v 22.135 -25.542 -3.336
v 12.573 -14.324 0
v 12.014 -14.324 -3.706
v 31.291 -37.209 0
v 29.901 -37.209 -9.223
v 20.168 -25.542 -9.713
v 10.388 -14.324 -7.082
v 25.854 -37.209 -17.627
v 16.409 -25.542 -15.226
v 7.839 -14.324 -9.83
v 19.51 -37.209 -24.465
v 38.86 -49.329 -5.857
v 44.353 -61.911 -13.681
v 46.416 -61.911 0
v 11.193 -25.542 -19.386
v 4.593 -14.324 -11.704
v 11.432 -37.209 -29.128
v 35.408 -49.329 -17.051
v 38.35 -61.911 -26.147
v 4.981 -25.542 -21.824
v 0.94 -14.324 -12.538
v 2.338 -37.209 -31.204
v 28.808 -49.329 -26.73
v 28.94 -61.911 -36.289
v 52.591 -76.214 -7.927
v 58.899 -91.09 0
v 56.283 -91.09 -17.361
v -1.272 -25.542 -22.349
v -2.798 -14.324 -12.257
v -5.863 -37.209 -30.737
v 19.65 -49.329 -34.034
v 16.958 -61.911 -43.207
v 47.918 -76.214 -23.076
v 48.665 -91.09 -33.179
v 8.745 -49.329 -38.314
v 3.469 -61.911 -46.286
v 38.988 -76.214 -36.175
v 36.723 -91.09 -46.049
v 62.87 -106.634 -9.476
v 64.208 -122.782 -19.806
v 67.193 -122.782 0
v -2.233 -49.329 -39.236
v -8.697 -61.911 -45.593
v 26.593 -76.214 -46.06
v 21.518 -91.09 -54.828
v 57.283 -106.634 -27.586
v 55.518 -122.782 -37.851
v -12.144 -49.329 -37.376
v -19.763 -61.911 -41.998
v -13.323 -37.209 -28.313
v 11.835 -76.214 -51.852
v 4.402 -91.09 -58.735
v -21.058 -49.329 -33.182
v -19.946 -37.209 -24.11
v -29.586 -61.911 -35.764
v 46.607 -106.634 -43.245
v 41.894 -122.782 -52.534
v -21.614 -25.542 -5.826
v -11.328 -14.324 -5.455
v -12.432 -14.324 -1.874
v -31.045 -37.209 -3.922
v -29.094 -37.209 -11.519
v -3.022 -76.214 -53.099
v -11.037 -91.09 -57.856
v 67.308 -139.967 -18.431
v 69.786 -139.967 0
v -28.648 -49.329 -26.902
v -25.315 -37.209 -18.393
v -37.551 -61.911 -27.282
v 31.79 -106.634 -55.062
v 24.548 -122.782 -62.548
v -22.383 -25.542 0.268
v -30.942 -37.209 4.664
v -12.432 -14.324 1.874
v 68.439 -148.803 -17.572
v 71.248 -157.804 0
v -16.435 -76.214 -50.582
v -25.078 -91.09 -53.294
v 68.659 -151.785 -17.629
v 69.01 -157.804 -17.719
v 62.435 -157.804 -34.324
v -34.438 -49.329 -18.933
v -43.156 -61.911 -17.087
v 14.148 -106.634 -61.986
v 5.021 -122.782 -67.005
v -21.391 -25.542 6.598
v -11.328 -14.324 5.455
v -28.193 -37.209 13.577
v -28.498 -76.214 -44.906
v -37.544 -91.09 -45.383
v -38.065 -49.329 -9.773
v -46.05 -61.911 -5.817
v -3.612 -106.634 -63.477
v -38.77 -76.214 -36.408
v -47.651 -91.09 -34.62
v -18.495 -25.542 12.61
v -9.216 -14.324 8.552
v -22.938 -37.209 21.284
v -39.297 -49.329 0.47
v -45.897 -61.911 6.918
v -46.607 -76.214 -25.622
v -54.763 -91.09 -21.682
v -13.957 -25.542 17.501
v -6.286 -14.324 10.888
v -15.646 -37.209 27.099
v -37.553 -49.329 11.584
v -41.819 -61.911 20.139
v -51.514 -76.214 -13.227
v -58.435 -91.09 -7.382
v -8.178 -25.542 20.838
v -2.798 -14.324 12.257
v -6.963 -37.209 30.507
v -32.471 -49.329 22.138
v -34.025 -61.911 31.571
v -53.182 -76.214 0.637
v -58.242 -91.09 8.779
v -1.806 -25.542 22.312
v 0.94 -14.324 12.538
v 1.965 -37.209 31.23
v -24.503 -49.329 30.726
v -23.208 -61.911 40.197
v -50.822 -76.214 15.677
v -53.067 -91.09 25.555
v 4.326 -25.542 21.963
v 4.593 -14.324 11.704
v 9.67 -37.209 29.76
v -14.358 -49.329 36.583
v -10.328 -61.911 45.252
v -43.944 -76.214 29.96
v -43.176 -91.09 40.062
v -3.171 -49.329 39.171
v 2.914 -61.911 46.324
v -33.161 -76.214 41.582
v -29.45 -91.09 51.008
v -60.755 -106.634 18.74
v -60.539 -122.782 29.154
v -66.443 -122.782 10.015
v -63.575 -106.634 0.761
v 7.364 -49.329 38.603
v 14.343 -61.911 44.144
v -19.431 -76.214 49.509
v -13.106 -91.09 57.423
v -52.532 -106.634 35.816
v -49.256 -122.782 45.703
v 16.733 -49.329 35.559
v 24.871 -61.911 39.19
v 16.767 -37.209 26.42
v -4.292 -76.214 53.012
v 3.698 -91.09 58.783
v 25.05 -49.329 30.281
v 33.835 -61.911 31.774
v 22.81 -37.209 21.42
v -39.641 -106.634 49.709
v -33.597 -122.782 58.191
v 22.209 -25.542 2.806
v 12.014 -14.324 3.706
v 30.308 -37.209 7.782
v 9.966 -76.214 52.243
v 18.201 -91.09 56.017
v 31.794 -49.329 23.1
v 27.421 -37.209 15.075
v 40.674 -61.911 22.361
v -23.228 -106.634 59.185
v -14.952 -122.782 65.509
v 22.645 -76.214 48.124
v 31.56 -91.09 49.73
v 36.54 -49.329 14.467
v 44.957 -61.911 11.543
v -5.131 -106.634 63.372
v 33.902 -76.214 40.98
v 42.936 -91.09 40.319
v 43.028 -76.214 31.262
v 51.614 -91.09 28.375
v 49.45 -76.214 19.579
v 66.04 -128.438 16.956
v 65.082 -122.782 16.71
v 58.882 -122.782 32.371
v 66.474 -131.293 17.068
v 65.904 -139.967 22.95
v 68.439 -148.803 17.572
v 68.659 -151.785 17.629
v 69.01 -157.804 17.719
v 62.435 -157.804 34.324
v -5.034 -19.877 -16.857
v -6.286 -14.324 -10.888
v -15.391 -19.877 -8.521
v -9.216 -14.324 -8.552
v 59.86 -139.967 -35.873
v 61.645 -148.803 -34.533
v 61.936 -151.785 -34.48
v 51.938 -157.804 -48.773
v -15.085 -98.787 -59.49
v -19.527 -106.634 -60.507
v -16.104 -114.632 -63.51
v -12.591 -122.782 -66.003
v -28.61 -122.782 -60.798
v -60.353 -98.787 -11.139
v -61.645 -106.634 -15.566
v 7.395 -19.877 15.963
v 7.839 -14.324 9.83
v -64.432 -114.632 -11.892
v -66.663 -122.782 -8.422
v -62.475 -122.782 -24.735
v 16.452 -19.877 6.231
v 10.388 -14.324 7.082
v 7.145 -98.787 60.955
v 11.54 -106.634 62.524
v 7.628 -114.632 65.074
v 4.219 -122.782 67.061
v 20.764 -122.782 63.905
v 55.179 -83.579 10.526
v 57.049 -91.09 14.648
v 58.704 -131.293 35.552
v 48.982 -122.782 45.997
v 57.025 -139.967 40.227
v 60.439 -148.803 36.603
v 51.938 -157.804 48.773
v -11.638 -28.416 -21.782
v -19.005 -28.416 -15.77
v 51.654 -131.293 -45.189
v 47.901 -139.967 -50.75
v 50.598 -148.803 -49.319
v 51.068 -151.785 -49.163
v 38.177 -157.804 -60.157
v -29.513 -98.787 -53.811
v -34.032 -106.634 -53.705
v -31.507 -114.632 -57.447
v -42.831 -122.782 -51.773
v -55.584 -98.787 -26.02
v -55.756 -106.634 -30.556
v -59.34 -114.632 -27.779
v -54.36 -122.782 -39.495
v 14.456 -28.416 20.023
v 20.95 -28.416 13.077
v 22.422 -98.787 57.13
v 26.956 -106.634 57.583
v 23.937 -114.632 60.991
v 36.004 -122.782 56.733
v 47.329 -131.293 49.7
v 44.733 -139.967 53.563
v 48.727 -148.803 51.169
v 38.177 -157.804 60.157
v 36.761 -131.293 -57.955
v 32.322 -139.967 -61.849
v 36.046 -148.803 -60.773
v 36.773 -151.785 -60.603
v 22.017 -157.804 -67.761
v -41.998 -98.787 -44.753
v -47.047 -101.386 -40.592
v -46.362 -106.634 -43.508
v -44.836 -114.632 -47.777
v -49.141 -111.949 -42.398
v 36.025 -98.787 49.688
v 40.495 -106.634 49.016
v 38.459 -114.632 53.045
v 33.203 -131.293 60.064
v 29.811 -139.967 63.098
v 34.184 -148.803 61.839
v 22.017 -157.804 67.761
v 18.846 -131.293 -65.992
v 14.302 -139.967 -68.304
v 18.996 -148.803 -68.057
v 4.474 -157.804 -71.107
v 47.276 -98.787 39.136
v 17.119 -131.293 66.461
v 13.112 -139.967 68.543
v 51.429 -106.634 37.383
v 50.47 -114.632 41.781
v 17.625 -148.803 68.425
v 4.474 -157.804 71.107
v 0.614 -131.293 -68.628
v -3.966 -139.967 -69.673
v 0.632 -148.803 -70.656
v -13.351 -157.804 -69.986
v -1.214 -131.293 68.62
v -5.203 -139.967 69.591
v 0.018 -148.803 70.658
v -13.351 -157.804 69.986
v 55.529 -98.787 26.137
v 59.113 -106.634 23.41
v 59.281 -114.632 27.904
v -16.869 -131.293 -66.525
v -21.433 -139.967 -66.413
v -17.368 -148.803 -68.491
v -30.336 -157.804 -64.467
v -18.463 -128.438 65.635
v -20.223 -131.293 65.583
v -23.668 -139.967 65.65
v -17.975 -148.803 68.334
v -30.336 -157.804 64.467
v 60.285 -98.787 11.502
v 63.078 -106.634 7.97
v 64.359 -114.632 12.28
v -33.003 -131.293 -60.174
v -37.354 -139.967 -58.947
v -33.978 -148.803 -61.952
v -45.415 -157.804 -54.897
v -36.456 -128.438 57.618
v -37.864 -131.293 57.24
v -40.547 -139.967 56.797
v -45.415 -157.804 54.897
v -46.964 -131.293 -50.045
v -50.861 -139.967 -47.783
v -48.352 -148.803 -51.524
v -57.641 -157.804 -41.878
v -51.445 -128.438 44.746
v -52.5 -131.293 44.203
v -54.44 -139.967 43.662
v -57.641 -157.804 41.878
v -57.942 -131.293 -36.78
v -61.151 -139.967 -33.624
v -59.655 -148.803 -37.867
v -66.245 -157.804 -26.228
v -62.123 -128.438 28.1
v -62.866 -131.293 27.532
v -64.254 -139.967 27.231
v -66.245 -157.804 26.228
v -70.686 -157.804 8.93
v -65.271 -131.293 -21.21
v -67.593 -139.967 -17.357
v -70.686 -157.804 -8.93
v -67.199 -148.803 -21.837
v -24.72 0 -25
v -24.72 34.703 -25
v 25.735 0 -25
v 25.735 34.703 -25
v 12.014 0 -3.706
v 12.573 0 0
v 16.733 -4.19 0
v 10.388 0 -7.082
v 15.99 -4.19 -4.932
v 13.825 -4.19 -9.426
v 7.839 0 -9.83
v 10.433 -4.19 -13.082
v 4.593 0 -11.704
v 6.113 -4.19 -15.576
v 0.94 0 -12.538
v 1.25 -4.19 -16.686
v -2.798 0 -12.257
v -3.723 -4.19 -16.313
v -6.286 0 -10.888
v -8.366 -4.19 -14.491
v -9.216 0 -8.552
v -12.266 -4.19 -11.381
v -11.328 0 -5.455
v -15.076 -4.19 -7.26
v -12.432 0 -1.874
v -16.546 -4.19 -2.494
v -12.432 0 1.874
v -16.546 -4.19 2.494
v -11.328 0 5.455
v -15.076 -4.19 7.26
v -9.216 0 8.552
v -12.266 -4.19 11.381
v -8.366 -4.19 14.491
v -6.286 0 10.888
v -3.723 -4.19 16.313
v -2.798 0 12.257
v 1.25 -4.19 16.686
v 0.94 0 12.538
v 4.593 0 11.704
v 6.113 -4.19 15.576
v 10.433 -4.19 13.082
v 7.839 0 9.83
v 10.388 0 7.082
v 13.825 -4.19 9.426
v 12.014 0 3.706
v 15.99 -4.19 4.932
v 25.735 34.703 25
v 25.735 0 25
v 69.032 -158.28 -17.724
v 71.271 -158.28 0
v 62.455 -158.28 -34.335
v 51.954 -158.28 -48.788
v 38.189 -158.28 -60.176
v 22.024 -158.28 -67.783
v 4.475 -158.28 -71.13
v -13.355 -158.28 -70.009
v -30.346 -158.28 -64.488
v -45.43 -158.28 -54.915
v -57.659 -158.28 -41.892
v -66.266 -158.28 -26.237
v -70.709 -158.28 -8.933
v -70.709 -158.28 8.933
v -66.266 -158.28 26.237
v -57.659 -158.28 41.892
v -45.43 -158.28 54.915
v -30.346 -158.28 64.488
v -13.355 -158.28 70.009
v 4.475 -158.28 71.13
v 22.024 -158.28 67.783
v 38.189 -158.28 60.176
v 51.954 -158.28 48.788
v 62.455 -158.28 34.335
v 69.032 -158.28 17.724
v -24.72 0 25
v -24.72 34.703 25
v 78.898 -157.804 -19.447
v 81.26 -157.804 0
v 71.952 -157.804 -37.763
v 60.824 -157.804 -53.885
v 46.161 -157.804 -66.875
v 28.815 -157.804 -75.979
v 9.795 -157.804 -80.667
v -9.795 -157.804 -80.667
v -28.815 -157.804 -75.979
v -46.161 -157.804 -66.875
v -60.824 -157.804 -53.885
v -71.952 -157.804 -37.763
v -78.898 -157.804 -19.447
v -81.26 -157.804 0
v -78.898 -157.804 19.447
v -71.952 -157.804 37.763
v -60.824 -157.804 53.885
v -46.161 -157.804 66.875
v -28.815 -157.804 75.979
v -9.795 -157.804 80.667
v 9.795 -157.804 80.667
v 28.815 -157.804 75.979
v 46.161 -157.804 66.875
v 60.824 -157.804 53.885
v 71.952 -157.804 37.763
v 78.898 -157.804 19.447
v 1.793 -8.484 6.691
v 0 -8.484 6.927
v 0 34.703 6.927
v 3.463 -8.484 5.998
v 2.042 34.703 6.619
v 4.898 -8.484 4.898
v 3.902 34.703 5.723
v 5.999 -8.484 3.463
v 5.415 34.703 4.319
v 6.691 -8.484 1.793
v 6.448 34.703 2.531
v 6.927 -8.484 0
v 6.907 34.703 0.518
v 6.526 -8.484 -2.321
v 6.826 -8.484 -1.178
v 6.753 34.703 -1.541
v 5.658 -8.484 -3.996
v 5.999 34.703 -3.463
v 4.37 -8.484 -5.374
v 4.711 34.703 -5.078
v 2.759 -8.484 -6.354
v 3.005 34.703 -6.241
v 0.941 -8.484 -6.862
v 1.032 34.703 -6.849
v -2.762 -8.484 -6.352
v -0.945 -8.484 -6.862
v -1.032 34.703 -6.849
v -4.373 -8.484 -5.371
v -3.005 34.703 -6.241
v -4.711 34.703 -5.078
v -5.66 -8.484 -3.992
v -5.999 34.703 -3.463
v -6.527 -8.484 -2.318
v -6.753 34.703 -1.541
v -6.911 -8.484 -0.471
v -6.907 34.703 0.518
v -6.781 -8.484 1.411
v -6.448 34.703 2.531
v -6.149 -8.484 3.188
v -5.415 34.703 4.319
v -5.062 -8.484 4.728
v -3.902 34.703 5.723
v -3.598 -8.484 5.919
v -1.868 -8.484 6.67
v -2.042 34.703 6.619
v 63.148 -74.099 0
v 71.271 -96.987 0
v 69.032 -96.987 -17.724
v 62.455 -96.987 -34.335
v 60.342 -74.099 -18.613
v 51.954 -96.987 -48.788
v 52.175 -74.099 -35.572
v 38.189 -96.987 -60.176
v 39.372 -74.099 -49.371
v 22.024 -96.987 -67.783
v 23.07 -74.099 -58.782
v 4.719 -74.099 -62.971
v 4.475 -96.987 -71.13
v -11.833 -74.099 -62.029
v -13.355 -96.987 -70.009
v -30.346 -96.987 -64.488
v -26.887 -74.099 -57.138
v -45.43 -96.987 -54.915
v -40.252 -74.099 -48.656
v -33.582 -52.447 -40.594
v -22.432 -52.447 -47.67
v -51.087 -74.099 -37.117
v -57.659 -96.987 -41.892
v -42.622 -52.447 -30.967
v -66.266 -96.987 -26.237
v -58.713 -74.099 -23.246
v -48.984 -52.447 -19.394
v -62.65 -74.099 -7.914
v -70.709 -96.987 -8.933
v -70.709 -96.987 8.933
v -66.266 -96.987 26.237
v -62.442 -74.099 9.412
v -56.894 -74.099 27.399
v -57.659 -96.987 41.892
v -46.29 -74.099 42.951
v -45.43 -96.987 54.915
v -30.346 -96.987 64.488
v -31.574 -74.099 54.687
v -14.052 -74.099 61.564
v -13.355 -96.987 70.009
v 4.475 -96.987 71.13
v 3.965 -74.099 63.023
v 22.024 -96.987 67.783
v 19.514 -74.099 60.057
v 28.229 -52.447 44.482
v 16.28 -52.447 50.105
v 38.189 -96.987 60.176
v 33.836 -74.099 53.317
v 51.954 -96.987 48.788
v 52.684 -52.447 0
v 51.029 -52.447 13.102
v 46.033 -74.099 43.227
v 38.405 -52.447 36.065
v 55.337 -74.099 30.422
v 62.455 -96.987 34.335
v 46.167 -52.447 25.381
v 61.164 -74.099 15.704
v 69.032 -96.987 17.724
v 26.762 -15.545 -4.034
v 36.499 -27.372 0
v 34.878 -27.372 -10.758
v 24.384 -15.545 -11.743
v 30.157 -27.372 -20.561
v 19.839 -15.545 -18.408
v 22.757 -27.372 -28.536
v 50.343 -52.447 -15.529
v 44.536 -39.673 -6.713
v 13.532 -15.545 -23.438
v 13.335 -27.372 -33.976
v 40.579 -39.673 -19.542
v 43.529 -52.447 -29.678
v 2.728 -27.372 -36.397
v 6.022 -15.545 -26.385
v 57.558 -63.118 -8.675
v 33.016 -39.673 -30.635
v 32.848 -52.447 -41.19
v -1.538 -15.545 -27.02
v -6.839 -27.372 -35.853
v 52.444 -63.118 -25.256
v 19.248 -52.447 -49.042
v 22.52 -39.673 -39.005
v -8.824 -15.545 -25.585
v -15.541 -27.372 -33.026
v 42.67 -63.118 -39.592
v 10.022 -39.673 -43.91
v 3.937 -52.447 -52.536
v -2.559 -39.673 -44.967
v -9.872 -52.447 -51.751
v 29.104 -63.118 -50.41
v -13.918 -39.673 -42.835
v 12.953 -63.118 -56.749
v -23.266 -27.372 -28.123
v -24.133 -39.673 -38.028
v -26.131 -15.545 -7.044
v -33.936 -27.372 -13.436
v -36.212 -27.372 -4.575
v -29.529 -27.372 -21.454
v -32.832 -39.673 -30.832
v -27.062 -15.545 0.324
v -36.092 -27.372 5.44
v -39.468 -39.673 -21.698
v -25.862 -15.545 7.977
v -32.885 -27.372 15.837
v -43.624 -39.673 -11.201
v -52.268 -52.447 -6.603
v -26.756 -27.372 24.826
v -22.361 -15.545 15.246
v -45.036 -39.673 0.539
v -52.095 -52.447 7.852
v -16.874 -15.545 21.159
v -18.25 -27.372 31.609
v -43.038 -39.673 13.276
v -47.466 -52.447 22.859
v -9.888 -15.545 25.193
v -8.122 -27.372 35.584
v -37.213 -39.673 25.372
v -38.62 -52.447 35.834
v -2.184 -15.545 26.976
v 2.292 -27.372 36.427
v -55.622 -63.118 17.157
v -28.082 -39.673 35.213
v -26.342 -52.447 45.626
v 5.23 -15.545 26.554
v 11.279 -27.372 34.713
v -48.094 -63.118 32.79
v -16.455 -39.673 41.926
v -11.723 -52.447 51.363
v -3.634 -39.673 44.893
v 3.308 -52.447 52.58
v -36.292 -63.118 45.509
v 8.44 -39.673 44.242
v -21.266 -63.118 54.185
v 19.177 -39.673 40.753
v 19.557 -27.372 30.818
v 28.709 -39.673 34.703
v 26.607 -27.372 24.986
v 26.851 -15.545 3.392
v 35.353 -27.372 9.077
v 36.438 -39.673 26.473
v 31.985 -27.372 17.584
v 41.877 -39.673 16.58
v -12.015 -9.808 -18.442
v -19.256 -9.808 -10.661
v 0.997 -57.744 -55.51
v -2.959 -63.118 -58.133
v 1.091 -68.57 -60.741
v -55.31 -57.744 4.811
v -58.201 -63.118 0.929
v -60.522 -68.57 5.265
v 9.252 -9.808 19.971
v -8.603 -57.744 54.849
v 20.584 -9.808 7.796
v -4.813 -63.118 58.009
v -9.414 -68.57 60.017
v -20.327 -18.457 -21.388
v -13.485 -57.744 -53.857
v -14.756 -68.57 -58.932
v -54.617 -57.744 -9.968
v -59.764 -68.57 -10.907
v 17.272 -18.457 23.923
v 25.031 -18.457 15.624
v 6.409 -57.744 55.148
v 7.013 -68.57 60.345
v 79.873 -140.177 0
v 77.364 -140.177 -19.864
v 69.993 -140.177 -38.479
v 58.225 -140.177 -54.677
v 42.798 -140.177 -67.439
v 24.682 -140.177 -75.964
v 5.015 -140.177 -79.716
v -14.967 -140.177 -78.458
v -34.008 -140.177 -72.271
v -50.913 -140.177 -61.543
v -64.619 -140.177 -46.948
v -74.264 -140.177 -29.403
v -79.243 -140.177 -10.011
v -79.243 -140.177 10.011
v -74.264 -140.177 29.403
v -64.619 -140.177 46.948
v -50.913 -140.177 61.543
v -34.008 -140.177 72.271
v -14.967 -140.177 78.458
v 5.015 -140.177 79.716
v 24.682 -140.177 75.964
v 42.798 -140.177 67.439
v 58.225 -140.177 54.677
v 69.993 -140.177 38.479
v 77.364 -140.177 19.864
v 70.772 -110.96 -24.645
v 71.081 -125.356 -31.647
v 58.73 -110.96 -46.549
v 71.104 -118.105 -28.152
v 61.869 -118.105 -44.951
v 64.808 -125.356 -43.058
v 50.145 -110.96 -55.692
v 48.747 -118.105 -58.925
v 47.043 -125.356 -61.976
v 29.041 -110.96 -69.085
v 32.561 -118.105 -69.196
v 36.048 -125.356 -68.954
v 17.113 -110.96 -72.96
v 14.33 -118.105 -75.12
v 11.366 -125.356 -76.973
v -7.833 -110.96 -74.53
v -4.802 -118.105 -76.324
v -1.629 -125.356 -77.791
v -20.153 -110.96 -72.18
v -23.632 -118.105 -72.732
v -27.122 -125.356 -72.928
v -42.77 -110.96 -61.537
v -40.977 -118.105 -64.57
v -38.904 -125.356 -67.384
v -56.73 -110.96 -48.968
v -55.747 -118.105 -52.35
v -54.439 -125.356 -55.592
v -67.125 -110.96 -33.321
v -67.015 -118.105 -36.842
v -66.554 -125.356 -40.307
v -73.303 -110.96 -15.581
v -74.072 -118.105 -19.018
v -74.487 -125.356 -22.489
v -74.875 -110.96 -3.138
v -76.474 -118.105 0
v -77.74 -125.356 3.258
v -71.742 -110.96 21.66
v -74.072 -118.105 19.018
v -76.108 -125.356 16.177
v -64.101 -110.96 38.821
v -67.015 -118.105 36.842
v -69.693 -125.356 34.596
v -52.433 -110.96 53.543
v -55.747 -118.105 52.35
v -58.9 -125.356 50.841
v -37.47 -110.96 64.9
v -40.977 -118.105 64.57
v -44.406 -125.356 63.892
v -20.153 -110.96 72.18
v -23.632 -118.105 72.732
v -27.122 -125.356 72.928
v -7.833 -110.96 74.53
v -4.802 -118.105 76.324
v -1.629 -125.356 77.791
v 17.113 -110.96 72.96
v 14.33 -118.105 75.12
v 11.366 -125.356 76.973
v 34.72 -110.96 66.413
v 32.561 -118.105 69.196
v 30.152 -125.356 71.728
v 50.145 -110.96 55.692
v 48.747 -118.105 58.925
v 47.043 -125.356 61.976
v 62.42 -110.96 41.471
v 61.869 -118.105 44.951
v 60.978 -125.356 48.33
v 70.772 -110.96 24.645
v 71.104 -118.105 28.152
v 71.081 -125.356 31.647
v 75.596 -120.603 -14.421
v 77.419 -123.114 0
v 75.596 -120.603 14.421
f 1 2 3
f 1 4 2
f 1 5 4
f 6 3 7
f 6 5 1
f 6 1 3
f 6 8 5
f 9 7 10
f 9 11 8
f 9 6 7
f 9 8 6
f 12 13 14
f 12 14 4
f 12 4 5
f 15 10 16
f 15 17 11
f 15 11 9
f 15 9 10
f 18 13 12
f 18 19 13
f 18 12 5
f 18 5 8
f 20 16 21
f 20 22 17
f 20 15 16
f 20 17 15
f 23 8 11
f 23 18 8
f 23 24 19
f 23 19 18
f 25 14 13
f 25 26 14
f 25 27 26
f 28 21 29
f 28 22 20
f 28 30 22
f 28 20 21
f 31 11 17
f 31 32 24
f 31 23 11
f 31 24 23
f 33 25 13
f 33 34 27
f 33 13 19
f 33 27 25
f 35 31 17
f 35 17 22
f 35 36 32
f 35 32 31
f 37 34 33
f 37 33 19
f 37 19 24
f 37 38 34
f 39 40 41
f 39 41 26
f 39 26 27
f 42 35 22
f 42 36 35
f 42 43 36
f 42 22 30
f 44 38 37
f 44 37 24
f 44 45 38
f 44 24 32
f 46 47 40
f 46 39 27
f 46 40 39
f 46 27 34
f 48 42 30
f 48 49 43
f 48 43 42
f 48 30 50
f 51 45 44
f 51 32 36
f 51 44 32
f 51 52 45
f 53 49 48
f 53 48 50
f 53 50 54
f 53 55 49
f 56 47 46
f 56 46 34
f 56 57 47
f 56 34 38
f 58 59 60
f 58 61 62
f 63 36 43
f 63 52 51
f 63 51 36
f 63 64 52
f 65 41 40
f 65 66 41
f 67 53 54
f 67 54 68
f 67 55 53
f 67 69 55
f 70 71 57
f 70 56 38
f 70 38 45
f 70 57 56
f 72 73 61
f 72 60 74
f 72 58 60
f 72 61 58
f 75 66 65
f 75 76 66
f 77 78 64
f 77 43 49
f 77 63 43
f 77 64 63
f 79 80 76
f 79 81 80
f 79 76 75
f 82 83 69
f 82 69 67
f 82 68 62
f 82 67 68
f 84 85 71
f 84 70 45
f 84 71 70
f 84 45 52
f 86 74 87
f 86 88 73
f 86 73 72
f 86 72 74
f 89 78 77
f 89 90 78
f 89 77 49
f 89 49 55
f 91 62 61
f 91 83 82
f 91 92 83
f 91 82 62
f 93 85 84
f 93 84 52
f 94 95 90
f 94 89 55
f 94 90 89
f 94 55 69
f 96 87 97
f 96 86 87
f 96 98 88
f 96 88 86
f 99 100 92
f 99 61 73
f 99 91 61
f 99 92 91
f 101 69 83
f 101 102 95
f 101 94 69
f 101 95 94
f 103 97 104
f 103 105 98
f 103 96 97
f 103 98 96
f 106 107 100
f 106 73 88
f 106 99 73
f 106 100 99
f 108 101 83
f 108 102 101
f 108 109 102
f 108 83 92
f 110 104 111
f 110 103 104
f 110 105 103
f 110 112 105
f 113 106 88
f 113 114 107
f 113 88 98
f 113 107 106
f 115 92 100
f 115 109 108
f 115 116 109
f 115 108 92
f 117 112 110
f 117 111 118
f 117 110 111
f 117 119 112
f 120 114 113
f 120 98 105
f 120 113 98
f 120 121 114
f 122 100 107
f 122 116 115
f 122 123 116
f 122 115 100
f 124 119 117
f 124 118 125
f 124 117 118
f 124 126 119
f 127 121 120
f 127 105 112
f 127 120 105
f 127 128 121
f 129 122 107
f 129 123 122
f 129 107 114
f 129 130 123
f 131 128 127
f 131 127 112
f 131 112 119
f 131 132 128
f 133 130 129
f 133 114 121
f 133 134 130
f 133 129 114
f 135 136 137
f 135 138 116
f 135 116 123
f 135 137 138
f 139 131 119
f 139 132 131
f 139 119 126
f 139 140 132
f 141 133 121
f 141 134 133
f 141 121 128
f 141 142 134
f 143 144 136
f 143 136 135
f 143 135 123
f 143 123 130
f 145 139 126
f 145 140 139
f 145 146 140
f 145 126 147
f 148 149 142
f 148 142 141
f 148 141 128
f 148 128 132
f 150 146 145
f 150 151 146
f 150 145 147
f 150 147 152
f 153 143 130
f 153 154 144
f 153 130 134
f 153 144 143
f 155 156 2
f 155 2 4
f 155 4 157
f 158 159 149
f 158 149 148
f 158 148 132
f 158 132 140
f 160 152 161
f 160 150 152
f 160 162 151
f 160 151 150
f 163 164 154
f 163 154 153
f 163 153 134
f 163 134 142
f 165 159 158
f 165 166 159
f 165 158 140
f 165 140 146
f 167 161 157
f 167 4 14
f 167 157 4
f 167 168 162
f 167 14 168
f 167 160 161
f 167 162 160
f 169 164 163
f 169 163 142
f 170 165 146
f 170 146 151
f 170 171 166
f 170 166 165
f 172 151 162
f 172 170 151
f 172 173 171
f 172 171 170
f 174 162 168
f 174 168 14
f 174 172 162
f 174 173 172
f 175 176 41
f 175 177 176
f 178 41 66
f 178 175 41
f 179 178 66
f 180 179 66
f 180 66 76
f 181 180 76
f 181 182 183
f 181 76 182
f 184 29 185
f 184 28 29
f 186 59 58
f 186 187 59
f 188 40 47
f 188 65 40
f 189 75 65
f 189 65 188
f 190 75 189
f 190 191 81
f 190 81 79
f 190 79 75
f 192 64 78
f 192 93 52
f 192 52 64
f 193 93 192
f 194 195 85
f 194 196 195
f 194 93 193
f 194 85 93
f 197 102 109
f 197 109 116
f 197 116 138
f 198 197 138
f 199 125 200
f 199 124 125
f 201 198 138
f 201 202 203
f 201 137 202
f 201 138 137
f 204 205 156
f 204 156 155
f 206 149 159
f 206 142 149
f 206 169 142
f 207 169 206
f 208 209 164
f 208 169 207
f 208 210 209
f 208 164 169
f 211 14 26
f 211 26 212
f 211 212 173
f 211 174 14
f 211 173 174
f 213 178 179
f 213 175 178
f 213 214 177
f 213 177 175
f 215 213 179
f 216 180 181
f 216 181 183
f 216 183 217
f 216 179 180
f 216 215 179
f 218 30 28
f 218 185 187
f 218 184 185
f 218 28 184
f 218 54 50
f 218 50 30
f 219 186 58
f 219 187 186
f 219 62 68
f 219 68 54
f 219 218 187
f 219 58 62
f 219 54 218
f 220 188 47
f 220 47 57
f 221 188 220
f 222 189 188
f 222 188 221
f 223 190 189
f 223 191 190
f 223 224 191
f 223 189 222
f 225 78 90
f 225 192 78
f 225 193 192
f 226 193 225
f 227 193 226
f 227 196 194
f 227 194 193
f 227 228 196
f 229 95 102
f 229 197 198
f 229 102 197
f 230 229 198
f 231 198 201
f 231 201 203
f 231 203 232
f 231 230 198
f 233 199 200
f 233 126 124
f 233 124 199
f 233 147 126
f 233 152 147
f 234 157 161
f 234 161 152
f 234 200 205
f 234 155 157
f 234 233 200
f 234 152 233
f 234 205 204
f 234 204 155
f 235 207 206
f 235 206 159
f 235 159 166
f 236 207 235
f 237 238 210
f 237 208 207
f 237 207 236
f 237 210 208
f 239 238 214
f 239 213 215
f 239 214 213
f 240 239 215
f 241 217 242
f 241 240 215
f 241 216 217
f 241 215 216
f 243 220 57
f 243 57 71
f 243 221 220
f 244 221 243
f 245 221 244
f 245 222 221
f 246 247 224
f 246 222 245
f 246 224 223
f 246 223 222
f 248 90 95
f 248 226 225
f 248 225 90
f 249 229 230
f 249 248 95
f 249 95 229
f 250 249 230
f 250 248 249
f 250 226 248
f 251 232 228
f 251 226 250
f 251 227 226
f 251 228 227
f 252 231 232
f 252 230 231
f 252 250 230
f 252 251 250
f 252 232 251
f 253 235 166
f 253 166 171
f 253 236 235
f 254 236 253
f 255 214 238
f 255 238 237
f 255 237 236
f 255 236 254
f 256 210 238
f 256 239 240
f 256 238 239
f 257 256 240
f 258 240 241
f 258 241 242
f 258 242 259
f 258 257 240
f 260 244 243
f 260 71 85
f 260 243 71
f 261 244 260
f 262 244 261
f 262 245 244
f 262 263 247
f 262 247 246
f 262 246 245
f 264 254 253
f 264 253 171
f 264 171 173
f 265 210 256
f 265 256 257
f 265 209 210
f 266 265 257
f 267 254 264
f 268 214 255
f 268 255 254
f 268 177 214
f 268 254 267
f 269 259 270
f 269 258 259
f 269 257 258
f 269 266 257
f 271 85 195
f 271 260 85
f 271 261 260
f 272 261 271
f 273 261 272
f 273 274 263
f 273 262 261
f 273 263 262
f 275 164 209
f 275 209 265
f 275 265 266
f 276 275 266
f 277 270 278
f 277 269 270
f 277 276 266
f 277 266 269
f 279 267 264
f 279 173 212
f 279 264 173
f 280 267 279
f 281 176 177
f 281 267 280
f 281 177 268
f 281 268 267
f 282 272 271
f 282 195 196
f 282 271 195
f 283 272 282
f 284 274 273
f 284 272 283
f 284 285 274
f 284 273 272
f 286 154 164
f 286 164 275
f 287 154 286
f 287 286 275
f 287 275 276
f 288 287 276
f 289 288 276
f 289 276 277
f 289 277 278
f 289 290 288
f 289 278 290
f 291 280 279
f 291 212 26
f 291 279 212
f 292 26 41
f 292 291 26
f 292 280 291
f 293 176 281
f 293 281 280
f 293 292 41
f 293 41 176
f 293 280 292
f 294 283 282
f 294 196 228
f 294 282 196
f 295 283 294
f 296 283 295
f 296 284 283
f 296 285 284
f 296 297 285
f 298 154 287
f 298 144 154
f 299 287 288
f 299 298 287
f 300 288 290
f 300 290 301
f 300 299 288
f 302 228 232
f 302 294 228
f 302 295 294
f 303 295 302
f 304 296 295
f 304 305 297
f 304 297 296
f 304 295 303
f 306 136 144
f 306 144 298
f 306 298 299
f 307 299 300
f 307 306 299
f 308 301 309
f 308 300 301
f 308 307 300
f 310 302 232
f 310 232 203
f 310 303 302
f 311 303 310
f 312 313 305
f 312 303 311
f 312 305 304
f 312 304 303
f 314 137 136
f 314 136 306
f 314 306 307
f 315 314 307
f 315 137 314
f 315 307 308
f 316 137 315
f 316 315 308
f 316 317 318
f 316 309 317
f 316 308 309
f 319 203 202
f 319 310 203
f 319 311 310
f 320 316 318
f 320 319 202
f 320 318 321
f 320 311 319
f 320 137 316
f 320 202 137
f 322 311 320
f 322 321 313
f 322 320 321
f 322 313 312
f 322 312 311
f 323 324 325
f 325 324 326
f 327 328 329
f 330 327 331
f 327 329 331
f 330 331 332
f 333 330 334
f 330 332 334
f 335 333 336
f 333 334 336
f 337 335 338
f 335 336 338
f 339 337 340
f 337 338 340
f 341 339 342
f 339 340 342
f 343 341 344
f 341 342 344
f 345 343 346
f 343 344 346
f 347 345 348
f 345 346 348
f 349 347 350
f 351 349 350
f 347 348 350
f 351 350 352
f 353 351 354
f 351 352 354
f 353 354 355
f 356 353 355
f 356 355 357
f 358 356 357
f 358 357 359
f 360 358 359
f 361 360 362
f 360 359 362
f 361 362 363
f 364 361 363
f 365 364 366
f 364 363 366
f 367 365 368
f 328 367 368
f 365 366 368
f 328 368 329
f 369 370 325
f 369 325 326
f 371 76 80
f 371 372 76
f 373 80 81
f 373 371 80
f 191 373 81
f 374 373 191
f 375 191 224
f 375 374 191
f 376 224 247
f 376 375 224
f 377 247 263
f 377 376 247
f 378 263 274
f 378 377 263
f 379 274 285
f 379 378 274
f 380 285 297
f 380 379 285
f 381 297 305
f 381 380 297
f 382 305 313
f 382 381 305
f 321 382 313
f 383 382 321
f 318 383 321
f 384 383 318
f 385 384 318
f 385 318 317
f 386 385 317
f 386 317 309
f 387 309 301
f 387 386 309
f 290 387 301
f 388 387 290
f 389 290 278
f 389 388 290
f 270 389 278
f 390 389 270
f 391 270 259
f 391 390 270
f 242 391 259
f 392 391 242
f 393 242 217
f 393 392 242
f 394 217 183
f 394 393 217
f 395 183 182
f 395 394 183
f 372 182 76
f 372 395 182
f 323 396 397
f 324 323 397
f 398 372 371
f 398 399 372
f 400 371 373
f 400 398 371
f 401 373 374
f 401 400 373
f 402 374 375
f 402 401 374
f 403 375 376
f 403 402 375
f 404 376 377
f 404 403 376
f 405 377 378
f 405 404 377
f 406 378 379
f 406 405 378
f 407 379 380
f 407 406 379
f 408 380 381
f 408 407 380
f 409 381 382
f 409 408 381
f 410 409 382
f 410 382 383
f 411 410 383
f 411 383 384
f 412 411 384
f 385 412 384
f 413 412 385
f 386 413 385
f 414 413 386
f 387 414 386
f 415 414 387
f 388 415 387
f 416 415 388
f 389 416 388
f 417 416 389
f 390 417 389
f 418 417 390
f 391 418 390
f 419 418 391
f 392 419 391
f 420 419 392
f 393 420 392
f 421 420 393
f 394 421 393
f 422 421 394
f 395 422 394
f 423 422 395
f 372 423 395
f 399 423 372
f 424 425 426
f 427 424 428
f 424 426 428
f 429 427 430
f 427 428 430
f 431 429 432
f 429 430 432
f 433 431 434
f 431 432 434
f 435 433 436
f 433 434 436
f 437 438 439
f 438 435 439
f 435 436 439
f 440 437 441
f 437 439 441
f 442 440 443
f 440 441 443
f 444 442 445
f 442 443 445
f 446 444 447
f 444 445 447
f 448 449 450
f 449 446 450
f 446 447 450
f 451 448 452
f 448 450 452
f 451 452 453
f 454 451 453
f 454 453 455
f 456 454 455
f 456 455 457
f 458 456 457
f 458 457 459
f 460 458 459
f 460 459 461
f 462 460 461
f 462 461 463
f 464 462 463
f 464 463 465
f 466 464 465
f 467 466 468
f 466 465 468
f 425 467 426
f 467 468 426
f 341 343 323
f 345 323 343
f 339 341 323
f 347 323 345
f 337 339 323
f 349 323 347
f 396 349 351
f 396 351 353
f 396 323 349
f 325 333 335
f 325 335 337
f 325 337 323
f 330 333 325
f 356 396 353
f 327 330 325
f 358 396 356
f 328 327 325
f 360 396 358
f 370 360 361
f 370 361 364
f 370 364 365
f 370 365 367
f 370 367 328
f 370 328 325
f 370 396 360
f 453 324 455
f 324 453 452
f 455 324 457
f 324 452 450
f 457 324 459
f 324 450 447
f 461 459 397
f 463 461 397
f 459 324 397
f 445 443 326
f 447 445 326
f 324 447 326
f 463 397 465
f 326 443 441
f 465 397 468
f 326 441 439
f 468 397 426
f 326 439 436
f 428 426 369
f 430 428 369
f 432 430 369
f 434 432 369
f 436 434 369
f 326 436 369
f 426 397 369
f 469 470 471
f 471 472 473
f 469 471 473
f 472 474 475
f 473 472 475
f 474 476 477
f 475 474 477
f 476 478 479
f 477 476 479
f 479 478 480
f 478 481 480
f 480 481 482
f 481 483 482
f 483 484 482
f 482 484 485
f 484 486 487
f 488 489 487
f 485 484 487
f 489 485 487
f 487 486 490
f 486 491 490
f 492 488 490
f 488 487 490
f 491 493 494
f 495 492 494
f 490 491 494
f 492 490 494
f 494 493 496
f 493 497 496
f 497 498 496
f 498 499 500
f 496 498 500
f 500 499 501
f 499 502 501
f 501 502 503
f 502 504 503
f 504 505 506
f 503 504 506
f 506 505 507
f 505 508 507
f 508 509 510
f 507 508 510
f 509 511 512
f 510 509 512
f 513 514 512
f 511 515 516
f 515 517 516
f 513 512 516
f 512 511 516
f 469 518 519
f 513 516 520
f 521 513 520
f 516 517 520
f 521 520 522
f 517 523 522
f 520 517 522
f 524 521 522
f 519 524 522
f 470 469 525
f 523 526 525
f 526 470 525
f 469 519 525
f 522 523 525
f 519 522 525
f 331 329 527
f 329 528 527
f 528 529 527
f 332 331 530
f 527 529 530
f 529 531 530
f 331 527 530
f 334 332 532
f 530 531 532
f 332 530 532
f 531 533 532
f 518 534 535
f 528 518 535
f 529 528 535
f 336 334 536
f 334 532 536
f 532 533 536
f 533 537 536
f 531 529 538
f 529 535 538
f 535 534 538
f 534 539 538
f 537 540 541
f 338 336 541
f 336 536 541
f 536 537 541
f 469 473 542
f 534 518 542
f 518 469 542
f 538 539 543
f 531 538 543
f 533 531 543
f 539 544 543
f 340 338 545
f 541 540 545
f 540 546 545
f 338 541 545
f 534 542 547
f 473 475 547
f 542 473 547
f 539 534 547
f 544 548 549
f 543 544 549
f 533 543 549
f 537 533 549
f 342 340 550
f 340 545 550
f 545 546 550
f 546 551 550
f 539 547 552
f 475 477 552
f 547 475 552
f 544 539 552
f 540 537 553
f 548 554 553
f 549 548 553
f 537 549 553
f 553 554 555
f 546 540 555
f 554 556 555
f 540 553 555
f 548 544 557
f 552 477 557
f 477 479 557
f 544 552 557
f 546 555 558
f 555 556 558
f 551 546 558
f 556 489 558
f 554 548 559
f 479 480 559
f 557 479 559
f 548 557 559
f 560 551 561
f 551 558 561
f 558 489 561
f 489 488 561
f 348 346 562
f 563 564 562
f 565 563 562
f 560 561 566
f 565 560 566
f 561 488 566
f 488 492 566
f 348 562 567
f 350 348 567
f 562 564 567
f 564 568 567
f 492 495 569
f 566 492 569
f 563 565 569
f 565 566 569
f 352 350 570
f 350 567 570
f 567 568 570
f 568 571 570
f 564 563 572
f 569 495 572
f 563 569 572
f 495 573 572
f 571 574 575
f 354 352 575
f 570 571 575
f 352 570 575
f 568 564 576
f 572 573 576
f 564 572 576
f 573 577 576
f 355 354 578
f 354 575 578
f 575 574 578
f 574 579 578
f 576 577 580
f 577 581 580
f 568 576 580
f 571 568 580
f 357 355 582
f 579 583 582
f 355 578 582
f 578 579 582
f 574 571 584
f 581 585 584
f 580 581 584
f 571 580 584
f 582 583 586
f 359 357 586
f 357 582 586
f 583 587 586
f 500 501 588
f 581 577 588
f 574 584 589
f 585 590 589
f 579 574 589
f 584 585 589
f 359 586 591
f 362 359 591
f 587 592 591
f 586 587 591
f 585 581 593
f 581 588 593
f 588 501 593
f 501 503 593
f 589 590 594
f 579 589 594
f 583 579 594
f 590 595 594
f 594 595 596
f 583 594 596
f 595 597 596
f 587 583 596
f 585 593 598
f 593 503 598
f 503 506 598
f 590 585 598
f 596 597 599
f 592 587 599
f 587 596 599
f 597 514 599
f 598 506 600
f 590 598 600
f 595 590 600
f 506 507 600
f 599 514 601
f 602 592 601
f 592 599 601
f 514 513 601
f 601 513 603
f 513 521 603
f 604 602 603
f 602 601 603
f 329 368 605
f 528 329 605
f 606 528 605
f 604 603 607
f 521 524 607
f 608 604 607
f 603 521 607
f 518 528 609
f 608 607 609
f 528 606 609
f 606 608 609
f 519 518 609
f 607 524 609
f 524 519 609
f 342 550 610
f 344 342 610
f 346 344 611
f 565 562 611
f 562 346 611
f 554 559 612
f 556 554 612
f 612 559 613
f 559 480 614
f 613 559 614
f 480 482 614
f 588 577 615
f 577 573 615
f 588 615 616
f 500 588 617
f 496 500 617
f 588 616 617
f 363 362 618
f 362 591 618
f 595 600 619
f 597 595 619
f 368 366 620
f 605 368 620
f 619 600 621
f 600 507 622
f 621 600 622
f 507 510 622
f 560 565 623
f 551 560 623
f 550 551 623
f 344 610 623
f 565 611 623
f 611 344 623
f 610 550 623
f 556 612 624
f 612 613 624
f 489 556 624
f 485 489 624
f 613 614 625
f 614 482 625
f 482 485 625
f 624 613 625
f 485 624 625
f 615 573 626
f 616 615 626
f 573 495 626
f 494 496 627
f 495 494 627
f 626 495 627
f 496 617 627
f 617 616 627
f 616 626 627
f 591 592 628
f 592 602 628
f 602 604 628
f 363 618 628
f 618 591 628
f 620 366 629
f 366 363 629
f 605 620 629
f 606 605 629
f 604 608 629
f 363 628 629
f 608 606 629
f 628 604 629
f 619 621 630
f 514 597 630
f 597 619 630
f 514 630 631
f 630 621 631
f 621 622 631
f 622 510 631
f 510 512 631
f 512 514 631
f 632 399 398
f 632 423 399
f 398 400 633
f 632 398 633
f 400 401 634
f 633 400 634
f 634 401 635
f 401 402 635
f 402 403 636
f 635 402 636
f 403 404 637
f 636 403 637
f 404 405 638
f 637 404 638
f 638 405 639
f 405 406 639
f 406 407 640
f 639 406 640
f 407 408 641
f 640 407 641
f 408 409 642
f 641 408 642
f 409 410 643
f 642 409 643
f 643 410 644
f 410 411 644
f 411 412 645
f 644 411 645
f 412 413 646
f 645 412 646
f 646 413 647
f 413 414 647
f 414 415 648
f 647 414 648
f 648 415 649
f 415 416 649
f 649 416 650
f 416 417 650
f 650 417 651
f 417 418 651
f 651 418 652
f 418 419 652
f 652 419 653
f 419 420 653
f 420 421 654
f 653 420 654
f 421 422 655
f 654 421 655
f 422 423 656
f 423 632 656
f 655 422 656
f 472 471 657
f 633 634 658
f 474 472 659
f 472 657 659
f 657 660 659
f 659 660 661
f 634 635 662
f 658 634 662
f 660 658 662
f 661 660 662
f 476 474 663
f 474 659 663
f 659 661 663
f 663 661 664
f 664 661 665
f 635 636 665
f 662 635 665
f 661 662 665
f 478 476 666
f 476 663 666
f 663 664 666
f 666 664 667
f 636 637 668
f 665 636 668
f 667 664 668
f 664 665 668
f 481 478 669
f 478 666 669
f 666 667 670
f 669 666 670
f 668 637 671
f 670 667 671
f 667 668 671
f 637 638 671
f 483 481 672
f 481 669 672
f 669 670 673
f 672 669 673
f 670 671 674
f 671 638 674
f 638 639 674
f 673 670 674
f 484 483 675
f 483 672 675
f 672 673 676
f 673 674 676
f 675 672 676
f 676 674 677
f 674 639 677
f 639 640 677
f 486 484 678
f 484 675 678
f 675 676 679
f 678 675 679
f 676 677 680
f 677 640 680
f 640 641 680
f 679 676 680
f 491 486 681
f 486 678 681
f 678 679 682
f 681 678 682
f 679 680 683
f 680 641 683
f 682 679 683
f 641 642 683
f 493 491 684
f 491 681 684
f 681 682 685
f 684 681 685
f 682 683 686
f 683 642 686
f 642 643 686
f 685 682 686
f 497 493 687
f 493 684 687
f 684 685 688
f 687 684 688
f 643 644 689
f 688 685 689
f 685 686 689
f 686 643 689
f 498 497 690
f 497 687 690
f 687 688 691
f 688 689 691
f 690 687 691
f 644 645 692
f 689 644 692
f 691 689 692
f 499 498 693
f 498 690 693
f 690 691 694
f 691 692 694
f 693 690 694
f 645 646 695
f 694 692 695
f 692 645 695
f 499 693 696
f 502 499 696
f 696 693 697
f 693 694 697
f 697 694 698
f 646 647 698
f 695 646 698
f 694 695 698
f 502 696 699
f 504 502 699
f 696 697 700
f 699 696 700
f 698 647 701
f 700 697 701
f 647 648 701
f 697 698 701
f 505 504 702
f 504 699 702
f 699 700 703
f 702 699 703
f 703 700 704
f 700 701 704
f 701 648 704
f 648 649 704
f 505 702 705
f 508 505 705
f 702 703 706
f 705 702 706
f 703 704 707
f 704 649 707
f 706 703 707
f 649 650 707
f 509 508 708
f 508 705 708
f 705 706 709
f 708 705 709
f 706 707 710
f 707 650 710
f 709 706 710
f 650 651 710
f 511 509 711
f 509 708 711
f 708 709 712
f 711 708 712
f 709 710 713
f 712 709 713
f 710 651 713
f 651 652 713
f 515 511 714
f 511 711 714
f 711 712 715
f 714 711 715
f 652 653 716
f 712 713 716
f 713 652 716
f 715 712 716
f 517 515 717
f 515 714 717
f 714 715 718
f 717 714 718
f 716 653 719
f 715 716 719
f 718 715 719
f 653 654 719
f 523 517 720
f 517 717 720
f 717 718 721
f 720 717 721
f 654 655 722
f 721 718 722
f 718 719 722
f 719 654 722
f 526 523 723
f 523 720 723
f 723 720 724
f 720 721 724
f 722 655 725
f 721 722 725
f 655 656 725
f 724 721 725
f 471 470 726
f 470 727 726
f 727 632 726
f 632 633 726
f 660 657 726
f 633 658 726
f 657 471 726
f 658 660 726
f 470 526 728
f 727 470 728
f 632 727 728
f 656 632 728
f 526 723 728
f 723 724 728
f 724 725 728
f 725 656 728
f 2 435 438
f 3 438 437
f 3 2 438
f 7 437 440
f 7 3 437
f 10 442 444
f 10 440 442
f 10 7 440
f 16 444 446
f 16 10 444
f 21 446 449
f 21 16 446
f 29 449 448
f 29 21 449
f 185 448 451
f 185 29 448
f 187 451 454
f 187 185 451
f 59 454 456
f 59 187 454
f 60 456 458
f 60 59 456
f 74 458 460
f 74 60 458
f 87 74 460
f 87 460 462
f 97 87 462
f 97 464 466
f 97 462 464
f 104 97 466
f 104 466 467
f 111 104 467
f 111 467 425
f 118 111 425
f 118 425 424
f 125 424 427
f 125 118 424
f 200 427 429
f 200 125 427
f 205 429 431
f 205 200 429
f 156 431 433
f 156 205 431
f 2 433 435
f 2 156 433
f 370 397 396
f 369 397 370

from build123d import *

# Parameters (mm, degrees)
REVOLVE_THIN1_OUTLINE_W   = 10
REVOLVE_THIN1_OUTLINE_H   = 4.190294711
REVOLVE_THIN1_OUTLINE_H_2 = 25.430398101
SKETCH4_W                 = 50.454885555
SKETCH4_H                 = 34.702925128
BOSS_EXTRUDE1_DEPTH       = 25
SKETCH5_R                 = 6.92656428
CUT_EXTRUDE1_DEPTH        = 50


# Read off the part's stored shape, not the designer's step: Revolve-Thin1
with BuildPart() as part:
    # Revolve-Thin1 outline → Revolve-Thin1 (revolve)
    with BuildSketch(Plane.XY):
        with BuildLine():
            Line((12.572695835, -4.190294711), (2.572695835, -4.190294711))
            add(Edge.make_bspline(
                [(2.572695835, -4.190294711), (3.256803477, -4.863264231), (4.111938029, -5.704476131), (5.052586036, -6.629809221), (5.351883129, -6.924233386), (5.480153312, -7.050415171), (5.565666767, -7.134536361), (5.60649606, -7.174703671), (5.975784665, -7.538349261), (7.610779142, -9.157595772), (9.214355978, -10.792063367), (11.18191941, -12.844557715), (11.880423743, -13.582762852), (12.572695835, -14.324008024)],
                knots=[0, 0, 0, 0, 0.015625, 0.01953125, 0.021484375, 0.022460937, 0.022460937, 0.0234375, 0.0234375, 0.03125, 0.0625, 0.0625, 0.079939883, 0.079939883, 0.079939883, 0.079939883], degree=3))
            Line((12.572695835, -14.324008024), (12.572695835, -4.190294711))
        make_face()
        with Locations((7.572695835, -2.095147355)):
            Rectangle(REVOLVE_THIN1_OUTLINE_W, REVOLVE_THIN1_OUTLINE_H)
        with BuildLine():
            Line((12.572695835, -4.190294711), (12.572695835, -14.324008024))
            add(Edge.make_bspline(
                [(12.572695835, -14.324008024), (14.361346695, -16.239192574), (16.108392925, -18.174671527), (22.545566832, -25.556112446), (26.95842293, -31.138237836), (39.252867809, -48.361072942), (46.191672462, -60.477354516), (57.598611585, -86.045280246), (62.066987666, -99.498416997), (68.499575811, -127.673184033), (70.487892964, -142.381255893), (71.247958055, -157.804064752)],
                knots=[0.079939883, 0.079939883, 0.079939883, 0.079939883, 0.125, 0.125, 0.25, 0.25, 0.5, 0.5, 0.75, 0.75, 0.997458266, 0.997458266, 0.997458266, 0.997458266], degree=3))
            Line((71.247958055, -157.804064752), (71.270990011, -157.804064752))
            Line((71.270990011, -157.804064752), (71.270990011, -96.986600276))
            add(Edge.make_bspline(
                [(16.732968649, -4.190294711), (55.715421715, -44.398968265), (71.270990011, -96.986600276)],
                knots=[0.032914248, 0.032914248, 0.032914248, 0.659474661, 0.659474661, 0.659474661], degree=2))
            Line((16.732968649, -4.190294711), (12.572695835, -4.190294711))
        make_face()
        with Locations((7.572695835, 12.715199051)):
            Rectangle(REVOLVE_THIN1_OUTLINE_W, REVOLVE_THIN1_OUTLINE_H_2)
        with BuildLine():
            Line((12.572695835, 0), (12.572695835, -4.190294711))
            Line((12.572695835, -4.190294711), (16.732968649, -4.190294711))
            add(Edge.make_bspline(
                [(12.572695835, 0), (14.685156347, -2.078067033), (16.732968649, -4.190294711)],
                knots=[0, 0, 0, 0.032914248, 0.032914248, 0.032914248], degree=2))
        make_face()
        with BuildLine():
            Line((71.270990011, -157.804064752), (71.247958055, -157.804064752))
            add(Edge.make_bspline(
                [(71.247958055, -157.804064752), (71.255764961, -157.96247806), (71.263442286, -158.120966773), (71.270990011, -158.279530915)],
                knots=[0.997458266, 0.997458266, 0.997458266, 0.997458266, 1, 1, 1, 1], degree=3))
            Line((71.270990011, -158.279530915), (71.270990011, -157.804064752))
        make_face()
        Polygon((71.270990011, -157.804064752), (71.270990011, -158.279530915), (81.259680211, -157.804064752), align=None)
        with BuildLine():
            Line((71.270990011, -96.986600276), (71.270990011, -157.804064752))
            Line((71.270990011, -157.804064752), (81.259680211, -157.804064752))
            add(Edge.make_bspline(
                [(71.270990011, -96.986600276), (79.725187008, -125.567118335), (81.259680211, -157.804064752)],
                knots=[0.659474661, 0.659474661, 0.659474661, 1, 1, 1], degree=2))
        make_face()
    revolve(axis=Axis((0, 0, 0), (0, 1, 0)))

    # Sketch4 → Boss-Extrude1 (add, symmetric)
    with BuildSketch(Plane.XY):
        with Locations((0.507285531, 17.351462564)):
            Rectangle(SKETCH4_W, SKETCH4_H)
    extrude(amount=BOSS_EXTRUDE1_DEPTH, both=True)

    # Sketch5 → Cut-Extrude1 (cut)
    with BuildSketch(Plane(origin=(0, 34.702925128, 0), x_dir=(1, 0, 0), z_dir=(0, 1, 0))):
        with Locations(Location((0, 0, 0), (0, 0, 270))):
            Circle(SKETCH5_R)
    extrude(amount=-CUT_EXTRUDE1_DEPTH, mode=Mode.SUBTRACT)


solid = part.part
